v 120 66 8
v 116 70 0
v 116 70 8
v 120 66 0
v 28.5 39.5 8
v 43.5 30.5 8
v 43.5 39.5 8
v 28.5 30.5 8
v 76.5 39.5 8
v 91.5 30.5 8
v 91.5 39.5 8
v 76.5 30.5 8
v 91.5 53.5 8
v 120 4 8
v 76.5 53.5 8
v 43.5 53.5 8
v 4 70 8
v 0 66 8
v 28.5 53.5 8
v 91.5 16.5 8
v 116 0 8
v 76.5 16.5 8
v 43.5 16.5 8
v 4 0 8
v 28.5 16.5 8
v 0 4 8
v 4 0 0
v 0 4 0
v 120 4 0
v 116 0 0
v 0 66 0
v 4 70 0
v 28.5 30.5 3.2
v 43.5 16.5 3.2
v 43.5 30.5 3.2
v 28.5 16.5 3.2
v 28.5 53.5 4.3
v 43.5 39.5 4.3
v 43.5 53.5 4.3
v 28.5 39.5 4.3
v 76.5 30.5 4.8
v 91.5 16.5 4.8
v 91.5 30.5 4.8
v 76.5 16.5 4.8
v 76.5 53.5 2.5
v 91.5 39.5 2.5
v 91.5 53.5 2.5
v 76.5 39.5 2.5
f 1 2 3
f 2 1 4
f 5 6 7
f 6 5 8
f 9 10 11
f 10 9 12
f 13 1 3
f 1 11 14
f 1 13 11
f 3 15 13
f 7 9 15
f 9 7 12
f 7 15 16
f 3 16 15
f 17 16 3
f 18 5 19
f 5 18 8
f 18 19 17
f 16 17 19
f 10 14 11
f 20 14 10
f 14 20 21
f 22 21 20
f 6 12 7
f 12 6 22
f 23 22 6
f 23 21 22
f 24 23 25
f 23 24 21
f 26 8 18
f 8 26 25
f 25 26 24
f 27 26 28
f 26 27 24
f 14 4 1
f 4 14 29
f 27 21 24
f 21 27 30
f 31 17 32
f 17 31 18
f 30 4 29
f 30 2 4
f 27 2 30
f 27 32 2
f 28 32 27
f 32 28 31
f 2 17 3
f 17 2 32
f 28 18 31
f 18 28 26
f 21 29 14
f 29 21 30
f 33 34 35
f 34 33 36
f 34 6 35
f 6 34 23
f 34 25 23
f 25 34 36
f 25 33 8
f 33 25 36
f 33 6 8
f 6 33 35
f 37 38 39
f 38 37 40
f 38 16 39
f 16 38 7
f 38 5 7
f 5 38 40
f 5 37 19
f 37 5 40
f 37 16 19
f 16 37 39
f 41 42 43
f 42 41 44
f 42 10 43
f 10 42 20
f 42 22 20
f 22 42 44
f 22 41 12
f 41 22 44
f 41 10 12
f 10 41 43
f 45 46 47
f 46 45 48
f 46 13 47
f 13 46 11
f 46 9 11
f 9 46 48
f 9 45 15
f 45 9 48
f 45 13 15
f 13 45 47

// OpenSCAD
$fn = 32;

// ----------------------------------------------------------------------
// Windowed plate: 4 voids, 120 x 70 x 8 mm
// ----------------------------------------------------------------------

// --- parameters (mm) ---
plate_l = 120;            // plate length, X
plate_w = 70;             // plate width, Y
plate_t = 8;              // plate thickness, Z
edge_margin = 12;         // wall from the plate edge to any window
win_l = 15;               // pocket length
win_w = 14;               // pocket width
pitch_x = 48;             // grid pitch along X
pitch_y = 23;             // grid pitch along Y
depth_1 = 4.8;            // depth of void 1 (full thickness = through)
depth_2 = 3.7;            // depth of void 2 (full thickness = through)
depth_3 = 3.2;            // depth of void 3 (full thickness = through)
depth_4 = 5.5;            // depth of void 4 (full thickness = through)
corner_c = 4;             // corner chamfer of the plate

profile = [[4, 0], [116, 0], [120, 4], [120, 66], [116, 70], [4, 70], [0, 66], [0, 4]];  // primary outline, 8 points, counter clockwise
void_1 = [[28.5, 16.5], [43.5, 16.5], [43.5, 30.5], [28.5, 30.5]];  // pocket at grid node 0,0, 4 points
void_2 = [[28.5, 39.5], [43.5, 39.5], [43.5, 53.5], [28.5, 53.5]];  // pocket at grid node 0,1, 4 points
void_3 = [[76.5, 16.5], [91.5, 16.5], [91.5, 30.5], [76.5, 30.5]];  // pocket at grid node 1,0, 4 points
void_4 = [[76.5, 39.5], [91.5, 39.5], [91.5, 53.5], [76.5, 53.5]];  // pocket at grid node 1,1, 4 points

// --- the one profile operation ---
difference() {
  linear_extrude(height = plate_t) polygon(points = profile);
  translate([0, 0, plate_t - depth_1])
    linear_extrude(height = depth_1 + 1) polygon(points = void_1);
  translate([0, 0, plate_t - depth_2])
    linear_extrude(height = depth_2 + 1) polygon(points = void_2);
  translate([0, 0, plate_t - depth_3])
    linear_extrude(height = depth_3 + 1) polygon(points = void_3);
  translate([0, 0, plate_t - depth_4])
    linear_extrude(height = depth_4 + 1) polygon(points = void_4);
}
